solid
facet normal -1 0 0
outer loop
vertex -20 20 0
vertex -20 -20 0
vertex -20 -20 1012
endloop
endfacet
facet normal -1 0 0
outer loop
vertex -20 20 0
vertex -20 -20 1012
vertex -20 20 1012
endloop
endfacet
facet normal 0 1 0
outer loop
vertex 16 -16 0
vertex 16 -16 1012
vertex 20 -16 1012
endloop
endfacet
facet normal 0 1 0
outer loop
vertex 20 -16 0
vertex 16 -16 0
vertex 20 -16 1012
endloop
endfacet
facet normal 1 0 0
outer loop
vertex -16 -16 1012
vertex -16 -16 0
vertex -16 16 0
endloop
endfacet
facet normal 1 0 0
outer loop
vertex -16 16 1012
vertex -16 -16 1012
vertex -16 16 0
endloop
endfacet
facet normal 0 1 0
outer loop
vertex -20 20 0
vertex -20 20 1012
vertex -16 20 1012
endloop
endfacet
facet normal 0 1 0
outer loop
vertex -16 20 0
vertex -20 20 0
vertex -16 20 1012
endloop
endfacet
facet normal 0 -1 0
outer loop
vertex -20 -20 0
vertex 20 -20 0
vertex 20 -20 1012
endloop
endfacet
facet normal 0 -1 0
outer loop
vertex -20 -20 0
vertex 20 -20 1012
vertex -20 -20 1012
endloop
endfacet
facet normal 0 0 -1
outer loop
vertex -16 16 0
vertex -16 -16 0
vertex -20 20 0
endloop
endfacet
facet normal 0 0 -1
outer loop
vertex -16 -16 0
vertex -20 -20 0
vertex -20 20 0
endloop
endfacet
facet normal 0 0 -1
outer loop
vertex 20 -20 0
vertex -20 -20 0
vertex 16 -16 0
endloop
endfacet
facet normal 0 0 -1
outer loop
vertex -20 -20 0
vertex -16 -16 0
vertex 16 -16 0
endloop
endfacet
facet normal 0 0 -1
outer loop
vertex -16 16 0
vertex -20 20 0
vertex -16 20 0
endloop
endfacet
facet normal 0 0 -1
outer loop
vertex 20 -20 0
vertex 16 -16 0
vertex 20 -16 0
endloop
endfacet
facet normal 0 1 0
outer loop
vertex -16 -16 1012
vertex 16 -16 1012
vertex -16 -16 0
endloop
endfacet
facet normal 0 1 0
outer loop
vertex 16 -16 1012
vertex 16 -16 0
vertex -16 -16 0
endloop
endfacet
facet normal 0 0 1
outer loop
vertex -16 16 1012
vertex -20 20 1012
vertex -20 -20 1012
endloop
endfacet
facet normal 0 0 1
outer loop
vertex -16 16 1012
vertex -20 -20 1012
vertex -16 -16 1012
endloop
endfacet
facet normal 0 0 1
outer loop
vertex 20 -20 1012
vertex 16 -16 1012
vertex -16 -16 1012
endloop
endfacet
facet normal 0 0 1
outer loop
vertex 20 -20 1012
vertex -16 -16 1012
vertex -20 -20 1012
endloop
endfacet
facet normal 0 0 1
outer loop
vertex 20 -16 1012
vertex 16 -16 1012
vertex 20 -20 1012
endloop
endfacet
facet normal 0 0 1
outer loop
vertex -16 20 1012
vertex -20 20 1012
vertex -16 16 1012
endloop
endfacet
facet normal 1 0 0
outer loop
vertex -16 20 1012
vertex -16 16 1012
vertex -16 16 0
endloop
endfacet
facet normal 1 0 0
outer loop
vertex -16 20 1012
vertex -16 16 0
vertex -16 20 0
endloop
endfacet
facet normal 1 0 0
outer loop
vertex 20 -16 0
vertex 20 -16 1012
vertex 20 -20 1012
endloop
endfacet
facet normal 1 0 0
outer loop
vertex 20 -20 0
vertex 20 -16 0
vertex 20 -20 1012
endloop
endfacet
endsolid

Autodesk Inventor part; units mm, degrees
ref_plane "YZ Plane" through (0, 0, 0) normal (1, 0, 0) x (0, 1, 0)
ref_plane "XZ Plane" through (0, 0, 0) normal (0, 1, 0) x (-1, 0, 0)
ref_plane "XY Plane" through (0, 0, 0) normal (0, 0, 1) x (1, 0, 0)
sketch "Boceto1" plane through (0, 0, 0) normal (0, 0, 1) x (1, 0, 0)
  line L0 (-20, 20) -> (20, 20)
  line L1 (20, 20) -> (20, -20)
  line L2 (20, -20) -> (-20, -20)
  line L3 (-20, -20) -> (-20, 20)
  line L4 (-20, 20) -> (20, -20) construction
  line L5 (-16, 16) -> (16, 16)
  line L6 (16, 16) -> (16, -16)
  line L7 (16, -16) -> (-16, -16)
  line L8 (-16, -16) -> (-16, 16)
  line L9 (-16, 0) -> (-20, 0) construction
  line L10 (0, 16) -> (0, 20) construction
  line L11 (16, 0) -> (20, 0) construction
  line L12 (0, -16) -> (0, -20) construction
  line L13 (-16, 16) -> (-16, 20)
  line L14 (16, -16) -> (20, -16)
  point P0 (0, 0)
  point P1 (0, 0)
  dimension "d0" = 40
  dimension "d1" = 4
  dimension "d4" = 40
extrude "Extrusión1" add sketch "Boceto1" along normal blind 1012 contours L0 L13 L8 L7 L14 L1 L2 L3
properties part number "C_358_40_2"
